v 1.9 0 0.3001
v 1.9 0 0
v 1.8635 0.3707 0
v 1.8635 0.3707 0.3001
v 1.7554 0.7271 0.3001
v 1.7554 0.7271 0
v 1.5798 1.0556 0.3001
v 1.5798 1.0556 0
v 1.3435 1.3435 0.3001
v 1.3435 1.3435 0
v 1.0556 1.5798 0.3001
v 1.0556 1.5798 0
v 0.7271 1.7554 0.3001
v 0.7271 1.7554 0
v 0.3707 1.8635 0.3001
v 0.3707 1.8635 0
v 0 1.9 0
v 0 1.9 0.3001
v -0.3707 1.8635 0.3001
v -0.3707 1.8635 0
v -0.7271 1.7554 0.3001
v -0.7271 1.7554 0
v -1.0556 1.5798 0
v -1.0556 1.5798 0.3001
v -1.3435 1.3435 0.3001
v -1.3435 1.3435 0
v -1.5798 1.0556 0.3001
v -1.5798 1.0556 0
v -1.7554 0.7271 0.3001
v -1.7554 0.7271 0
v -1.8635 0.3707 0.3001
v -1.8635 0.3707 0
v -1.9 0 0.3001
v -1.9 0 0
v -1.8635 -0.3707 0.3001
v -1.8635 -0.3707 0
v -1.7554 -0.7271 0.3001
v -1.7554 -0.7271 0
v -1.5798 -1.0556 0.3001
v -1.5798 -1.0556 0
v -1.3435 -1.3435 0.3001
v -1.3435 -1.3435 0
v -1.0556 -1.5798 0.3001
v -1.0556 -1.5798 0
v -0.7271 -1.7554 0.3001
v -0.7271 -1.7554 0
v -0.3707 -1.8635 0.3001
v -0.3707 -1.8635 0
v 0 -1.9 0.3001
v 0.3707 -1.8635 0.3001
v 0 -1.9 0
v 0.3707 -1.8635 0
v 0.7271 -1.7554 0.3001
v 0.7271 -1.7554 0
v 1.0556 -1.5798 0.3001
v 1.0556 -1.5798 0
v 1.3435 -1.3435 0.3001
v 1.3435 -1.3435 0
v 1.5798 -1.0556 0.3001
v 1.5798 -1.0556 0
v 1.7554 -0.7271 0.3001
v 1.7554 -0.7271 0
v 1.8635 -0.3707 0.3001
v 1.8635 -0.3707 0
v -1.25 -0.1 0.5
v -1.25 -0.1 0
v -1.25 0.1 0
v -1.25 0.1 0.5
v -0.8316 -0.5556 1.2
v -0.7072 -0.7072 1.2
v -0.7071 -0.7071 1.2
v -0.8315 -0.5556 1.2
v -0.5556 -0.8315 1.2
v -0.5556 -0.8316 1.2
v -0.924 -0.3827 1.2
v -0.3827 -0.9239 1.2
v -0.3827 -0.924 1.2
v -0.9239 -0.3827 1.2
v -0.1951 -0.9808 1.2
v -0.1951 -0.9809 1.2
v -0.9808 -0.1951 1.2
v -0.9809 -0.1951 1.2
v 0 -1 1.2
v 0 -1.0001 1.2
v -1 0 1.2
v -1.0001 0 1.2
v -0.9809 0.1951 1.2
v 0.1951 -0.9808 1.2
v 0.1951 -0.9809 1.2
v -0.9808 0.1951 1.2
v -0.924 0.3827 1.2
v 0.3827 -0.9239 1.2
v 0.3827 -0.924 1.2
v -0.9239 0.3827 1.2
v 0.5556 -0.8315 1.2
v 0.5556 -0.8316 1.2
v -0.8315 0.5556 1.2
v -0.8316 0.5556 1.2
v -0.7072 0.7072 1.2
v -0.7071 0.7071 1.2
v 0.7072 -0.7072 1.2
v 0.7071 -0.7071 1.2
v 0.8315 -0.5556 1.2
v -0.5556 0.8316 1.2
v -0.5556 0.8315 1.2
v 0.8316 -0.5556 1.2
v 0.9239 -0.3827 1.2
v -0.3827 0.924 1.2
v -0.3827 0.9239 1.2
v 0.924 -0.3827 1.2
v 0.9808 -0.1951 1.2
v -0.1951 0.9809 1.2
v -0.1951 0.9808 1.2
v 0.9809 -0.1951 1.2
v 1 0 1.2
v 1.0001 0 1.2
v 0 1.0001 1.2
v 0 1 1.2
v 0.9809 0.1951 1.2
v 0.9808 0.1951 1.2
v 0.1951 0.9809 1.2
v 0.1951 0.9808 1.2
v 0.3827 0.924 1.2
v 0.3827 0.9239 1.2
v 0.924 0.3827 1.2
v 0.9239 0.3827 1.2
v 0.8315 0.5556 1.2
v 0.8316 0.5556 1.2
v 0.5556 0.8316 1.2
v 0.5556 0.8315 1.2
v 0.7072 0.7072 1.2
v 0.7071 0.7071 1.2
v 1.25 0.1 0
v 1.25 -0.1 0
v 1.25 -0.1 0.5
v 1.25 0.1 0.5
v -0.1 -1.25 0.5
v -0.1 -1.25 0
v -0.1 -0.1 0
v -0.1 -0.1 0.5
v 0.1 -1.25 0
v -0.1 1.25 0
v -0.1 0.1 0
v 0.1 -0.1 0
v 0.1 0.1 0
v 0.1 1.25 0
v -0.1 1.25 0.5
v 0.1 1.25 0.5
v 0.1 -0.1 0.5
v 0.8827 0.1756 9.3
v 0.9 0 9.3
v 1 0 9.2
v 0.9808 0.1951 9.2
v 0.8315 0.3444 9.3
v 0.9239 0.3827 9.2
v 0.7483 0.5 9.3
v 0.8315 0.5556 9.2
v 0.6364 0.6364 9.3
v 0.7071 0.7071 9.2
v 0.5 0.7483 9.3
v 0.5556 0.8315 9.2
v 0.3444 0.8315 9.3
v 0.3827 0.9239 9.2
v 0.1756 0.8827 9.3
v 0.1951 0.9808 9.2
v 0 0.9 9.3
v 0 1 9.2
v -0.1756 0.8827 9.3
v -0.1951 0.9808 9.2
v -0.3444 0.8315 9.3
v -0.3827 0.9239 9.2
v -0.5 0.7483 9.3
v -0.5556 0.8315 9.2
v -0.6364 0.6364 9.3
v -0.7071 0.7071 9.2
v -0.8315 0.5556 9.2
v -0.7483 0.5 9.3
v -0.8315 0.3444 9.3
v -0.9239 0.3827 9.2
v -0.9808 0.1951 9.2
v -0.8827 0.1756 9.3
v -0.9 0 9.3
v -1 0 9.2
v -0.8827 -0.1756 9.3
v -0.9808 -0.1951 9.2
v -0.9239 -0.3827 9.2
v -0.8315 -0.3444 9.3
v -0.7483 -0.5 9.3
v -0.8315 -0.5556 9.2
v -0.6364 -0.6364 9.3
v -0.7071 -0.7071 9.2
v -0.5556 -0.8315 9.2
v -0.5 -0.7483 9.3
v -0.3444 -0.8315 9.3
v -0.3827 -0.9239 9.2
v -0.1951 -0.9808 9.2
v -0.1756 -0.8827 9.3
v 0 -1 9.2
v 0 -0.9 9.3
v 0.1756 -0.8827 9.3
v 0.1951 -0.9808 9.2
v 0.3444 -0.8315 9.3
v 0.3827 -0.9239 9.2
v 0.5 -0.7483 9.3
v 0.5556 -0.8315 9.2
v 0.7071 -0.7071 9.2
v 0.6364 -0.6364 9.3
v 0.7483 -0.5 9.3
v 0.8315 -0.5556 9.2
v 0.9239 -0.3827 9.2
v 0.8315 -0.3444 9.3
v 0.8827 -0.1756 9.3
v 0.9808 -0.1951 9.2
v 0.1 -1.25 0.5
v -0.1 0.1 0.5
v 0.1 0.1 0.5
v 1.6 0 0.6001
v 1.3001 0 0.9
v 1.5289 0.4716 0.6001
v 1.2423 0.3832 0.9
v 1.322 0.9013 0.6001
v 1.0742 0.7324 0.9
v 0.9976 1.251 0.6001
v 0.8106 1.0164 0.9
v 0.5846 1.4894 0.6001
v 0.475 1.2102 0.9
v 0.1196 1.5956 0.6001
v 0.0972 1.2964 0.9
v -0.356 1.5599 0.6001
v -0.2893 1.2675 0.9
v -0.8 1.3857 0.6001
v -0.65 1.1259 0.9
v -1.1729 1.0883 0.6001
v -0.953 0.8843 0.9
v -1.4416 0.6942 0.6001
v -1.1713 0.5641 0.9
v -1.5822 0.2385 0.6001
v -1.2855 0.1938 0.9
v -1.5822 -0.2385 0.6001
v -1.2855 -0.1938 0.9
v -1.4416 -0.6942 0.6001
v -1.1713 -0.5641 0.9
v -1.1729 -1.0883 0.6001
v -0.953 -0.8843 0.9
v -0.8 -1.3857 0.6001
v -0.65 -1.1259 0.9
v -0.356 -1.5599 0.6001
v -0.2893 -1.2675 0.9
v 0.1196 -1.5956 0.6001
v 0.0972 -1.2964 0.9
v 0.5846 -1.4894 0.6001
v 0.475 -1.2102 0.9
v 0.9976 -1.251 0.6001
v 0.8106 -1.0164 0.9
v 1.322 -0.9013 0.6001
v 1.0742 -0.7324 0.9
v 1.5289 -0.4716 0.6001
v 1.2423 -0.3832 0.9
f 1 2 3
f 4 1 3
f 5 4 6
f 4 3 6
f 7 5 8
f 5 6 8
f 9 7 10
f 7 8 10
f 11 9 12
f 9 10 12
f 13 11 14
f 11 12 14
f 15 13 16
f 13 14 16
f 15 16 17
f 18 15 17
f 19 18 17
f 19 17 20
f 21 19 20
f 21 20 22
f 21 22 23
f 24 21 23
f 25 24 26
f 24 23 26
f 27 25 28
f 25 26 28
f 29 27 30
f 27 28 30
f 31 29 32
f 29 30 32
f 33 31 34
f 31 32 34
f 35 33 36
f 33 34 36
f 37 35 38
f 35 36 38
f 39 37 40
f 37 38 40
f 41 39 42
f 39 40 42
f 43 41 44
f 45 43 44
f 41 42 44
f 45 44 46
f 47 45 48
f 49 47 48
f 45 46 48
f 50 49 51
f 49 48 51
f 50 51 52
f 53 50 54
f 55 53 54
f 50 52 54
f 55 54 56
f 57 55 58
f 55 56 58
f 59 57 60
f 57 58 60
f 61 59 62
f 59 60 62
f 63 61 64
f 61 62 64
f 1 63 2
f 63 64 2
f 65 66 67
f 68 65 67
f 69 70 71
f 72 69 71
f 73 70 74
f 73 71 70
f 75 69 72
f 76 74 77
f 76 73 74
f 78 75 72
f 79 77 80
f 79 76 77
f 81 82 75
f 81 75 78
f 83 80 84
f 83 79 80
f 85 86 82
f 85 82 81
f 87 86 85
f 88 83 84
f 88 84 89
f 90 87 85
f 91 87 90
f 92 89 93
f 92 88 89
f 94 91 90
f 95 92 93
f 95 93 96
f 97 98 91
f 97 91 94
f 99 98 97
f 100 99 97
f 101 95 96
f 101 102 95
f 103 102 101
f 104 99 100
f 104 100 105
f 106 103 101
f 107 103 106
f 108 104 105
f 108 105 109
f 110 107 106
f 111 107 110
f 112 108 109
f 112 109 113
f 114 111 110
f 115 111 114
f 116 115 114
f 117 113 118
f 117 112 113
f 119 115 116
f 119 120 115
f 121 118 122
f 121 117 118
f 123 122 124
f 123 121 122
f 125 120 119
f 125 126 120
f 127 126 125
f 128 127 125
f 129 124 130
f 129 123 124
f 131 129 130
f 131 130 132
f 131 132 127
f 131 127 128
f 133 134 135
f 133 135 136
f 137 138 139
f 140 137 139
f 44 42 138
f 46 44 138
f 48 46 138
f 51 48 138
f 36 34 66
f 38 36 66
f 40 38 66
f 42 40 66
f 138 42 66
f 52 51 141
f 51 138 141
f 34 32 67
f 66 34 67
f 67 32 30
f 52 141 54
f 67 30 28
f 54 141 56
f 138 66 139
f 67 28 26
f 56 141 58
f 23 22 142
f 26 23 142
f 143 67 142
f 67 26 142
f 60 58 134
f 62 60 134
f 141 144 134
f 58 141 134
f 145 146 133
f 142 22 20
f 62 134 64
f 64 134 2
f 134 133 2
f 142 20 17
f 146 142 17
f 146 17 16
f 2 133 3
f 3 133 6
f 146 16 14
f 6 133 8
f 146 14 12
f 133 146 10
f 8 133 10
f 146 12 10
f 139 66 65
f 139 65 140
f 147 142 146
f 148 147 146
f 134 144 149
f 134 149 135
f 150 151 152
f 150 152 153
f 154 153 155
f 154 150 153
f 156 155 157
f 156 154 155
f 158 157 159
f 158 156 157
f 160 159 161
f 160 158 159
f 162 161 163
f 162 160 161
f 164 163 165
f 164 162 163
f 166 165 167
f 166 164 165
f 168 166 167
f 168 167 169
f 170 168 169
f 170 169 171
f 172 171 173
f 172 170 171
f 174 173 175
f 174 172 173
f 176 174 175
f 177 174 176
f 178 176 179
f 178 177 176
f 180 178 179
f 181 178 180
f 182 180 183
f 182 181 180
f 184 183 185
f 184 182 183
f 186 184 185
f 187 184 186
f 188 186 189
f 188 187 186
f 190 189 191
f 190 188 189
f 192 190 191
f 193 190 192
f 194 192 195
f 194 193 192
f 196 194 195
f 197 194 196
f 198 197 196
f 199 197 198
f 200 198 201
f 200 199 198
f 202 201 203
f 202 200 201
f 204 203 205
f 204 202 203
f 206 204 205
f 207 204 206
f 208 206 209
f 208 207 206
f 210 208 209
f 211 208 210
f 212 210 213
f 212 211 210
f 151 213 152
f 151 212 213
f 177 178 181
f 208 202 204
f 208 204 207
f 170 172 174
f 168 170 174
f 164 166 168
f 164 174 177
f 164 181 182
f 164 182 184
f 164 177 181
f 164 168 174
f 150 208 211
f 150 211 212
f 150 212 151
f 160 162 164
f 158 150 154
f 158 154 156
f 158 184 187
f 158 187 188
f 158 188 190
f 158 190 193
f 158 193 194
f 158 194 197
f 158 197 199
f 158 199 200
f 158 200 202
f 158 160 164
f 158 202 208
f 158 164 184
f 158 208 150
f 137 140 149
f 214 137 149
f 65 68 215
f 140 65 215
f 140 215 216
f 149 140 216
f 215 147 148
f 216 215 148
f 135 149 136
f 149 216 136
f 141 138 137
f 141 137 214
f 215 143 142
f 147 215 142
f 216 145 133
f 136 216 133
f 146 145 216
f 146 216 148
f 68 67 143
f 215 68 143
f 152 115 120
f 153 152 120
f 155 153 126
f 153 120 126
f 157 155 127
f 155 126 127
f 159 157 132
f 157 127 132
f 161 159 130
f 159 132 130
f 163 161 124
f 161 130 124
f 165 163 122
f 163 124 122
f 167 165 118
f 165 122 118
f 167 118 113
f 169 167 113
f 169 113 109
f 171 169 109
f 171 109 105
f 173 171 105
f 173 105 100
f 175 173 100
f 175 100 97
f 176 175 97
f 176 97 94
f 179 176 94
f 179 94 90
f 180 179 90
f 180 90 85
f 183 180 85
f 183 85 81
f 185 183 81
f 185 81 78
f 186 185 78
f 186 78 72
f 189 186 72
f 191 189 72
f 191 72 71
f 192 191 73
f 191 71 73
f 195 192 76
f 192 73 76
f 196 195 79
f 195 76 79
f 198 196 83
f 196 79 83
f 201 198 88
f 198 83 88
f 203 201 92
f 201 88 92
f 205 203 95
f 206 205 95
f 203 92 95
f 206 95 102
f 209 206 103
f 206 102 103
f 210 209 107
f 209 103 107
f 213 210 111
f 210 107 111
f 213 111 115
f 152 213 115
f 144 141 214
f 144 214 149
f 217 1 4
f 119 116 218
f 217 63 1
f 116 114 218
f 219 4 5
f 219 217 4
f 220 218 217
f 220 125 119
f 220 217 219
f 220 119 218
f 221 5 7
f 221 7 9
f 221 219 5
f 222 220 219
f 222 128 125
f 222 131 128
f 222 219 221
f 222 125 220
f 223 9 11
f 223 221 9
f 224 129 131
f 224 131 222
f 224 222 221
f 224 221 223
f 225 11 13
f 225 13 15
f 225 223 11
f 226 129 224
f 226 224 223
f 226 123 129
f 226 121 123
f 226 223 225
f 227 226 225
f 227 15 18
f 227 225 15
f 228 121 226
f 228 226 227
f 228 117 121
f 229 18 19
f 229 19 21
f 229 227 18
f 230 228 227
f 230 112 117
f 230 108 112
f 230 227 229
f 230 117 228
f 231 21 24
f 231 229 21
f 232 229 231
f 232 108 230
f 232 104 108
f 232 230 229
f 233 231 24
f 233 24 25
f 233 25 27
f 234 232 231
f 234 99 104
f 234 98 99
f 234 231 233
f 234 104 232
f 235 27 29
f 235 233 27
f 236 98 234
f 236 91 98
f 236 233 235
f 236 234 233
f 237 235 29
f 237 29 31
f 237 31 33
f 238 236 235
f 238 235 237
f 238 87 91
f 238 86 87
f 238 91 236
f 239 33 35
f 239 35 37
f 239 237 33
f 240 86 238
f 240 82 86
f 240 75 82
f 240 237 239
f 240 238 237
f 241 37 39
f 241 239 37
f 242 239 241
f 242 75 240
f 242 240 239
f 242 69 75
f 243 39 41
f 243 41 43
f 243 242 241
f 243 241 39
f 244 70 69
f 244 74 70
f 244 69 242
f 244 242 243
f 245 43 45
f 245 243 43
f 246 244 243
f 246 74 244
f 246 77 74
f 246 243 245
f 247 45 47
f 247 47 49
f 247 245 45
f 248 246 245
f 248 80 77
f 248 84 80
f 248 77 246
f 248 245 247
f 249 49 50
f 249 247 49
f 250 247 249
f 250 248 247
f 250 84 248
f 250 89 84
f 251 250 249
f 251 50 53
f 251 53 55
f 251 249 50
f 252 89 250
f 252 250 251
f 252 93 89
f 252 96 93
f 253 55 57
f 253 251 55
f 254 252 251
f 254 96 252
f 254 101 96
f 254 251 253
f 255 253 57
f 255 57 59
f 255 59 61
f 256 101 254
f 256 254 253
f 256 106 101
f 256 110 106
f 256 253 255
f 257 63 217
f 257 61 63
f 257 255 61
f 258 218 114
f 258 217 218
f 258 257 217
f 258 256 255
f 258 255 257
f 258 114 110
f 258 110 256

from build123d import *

# Parameters (mm, degrees)
BOX_W             = 0.2
BOX_H             = 2.5
BOX_DEPTH         = 0.5
BOX001_W          = 2.5
BOX001_H          = 0.2
BOX001_DEPTH      = 0.5
CYLINDER_R        = 1.9
CYLINDER_DEPTH    = 1.2
CYLINDER001_R     = 1
CYLINDER001_DEPTH = 9.2
CHAMFER_SIZE      = 0.8999
CHAMFER001_SIZE   = 0.1


with BuildPart() as w_rfel:
    # Box → Box (new body)
    with BuildSketch(Plane(origin=(-0.1, -1.25, 0), x_dir=(1, 0, 0), z_dir=(0, 0, 1))):
        with Locations((0.1, 1.25)):
            Rectangle(BOX_W, BOX_H)
    extrude(amount=BOX_DEPTH)


with BuildPart() as fusion:
    # Box001 → Box001 (new body)
    with BuildSketch(Plane(origin=(-1.25, -0.1, 0), x_dir=(1, 0, 0), z_dir=(0, 0, 1))):
        with Locations((1.25, 0.1)):
            Rectangle(BOX001_W, BOX001_H)
    extrude(amount=BOX001_DEPTH)

    # Fusion: union Würfel
    add(w_rfel.part)


with BuildPart() as zylinder:
    # Cylinder → Cylinder (new body)
    with BuildSketch(Plane.XY):
        Circle(CYLINDER_R)
    extrude(amount=CYLINDER_DEPTH)


with BuildPart() as screw:
    # Cylinder001 → Cylinder001 (new body)
    with BuildSketch(Plane.XY.offset(0.1)):
        Circle(CYLINDER001_R)
    extrude(amount=CYLINDER001_DEPTH)

    # Fusion001: union Zylinder
    add(zylinder.part)

    # Cut: cut Fusion
    add(fusion.part, mode=Mode.SUBTRACT)

    # Chamfer
    chamfer_edges = [screw.edges().sort_by_distance(p)[0] for p in [
        (-1.9, 0, 1.2),
    ]]
    chamfer(chamfer_edges, length=CHAMFER_SIZE)

    # Chamfer001
    chamfer001_edges = [screw.edges().sort_by_distance(p)[0] for p in [
        (-1, 0, 9.3),
    ]]
    chamfer(chamfer001_edges, length=CHAMFER001_SIZE)


solid = screw.part
